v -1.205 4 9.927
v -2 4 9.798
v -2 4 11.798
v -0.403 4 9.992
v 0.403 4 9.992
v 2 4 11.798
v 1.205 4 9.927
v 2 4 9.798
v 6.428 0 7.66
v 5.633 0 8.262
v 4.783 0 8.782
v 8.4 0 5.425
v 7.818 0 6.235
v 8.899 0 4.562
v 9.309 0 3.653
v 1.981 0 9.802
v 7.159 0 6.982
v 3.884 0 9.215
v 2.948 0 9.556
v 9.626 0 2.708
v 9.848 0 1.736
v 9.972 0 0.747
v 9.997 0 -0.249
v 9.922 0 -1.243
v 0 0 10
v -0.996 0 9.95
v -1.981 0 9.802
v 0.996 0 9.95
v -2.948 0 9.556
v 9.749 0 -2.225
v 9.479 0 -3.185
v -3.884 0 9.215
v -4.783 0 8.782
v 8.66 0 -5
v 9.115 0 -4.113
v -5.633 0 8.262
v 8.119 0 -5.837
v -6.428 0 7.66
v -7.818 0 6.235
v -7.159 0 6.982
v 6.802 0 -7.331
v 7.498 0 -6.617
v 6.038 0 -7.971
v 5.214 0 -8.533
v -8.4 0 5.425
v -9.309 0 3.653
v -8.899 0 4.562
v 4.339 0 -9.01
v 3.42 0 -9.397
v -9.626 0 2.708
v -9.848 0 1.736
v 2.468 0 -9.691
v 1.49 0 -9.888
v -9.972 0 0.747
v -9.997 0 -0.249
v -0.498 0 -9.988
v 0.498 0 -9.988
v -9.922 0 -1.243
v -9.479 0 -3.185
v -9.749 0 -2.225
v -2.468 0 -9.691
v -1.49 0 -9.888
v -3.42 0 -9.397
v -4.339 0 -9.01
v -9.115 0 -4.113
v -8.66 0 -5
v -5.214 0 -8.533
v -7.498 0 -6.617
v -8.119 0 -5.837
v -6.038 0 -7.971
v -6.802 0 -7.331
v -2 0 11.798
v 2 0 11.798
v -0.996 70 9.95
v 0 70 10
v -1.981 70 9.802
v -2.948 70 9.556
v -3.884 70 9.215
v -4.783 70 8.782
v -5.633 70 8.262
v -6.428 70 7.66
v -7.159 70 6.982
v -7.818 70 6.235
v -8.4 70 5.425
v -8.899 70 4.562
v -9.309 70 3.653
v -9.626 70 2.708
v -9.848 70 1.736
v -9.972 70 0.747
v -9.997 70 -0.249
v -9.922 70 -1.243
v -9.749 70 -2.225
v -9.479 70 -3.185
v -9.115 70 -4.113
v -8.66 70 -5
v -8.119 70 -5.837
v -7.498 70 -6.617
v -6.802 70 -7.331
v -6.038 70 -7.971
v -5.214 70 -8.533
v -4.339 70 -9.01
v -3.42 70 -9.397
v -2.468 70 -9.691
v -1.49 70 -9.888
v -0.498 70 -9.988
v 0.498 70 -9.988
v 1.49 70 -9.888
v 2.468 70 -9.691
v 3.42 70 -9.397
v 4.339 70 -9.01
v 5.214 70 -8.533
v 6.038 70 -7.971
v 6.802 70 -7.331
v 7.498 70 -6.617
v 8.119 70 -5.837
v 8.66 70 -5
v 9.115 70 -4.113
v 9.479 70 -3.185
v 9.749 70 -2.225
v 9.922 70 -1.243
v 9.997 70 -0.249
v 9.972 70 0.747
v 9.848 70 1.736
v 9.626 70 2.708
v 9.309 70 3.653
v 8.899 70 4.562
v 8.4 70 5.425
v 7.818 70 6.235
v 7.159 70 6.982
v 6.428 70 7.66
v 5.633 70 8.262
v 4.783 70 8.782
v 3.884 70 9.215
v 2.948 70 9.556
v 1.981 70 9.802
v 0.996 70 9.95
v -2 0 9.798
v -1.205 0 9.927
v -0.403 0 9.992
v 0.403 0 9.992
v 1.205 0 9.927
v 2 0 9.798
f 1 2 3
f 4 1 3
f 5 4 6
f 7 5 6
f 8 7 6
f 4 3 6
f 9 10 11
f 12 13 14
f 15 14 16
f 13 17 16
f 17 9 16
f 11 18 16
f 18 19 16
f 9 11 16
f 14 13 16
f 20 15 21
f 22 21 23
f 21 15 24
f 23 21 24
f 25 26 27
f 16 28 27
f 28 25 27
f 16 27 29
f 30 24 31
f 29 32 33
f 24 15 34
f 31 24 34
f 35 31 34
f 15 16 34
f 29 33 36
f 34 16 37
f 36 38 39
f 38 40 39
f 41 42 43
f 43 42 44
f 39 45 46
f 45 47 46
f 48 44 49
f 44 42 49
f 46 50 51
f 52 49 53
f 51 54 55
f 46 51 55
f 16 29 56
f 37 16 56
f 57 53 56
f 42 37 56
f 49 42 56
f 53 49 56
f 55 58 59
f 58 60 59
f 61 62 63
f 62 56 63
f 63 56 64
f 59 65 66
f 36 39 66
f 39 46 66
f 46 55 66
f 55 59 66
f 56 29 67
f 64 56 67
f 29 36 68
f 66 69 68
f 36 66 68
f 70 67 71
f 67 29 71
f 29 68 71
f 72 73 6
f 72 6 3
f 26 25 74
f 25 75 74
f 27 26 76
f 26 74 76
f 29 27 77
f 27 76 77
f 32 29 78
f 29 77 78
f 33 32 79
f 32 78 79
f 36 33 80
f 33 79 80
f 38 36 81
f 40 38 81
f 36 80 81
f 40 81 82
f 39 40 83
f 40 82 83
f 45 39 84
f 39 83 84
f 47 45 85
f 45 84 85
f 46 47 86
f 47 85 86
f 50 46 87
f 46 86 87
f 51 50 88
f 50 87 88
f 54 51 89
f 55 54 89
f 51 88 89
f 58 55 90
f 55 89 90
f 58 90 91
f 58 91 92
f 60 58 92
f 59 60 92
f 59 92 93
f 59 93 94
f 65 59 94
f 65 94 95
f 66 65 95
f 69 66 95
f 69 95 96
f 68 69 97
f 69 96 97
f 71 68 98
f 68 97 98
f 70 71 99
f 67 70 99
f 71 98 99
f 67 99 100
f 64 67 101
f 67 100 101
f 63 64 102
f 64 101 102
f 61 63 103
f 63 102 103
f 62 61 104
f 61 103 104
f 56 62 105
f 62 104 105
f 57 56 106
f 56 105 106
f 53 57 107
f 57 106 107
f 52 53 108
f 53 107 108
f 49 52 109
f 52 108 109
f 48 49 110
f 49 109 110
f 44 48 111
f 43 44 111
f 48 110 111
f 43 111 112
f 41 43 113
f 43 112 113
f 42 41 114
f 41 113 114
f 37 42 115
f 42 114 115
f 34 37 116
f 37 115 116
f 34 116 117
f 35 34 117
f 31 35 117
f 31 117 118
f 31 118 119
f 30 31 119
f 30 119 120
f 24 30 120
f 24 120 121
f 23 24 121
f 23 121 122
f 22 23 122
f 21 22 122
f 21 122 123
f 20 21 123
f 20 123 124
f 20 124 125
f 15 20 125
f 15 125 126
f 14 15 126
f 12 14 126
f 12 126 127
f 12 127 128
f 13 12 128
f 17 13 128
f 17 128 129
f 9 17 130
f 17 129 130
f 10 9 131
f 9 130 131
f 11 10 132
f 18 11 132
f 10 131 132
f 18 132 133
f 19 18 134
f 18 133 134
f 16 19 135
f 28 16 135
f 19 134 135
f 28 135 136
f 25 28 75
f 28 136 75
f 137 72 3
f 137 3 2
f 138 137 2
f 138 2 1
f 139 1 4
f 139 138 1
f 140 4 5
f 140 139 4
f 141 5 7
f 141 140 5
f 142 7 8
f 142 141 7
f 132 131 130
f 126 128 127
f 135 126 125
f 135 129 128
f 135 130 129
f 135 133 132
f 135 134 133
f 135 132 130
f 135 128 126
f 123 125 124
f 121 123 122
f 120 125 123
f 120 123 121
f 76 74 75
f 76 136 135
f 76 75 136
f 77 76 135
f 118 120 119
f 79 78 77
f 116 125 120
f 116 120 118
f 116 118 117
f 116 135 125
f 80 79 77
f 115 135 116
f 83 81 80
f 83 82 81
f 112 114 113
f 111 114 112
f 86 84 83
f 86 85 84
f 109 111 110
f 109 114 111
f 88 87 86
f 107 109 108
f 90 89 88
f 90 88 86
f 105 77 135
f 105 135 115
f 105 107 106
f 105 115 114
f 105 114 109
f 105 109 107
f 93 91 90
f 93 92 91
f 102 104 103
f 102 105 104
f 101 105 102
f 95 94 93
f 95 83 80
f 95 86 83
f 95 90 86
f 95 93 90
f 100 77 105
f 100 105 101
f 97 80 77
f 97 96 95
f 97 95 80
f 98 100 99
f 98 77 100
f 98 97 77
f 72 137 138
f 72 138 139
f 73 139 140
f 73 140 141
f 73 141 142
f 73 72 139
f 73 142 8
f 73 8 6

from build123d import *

# Parameters (mm, degrees)
SKETCH1_W           = 10
SKETCH1_H           = 70
BOSS_EXTRUDE1_DEPTH = 4


with BuildPart() as part:
    # Sketch1 → Revolve1 (revolve)
    with BuildSketch(Plane.XY, mode=Mode.PRIVATE) as revolve1_sk:
        with Locations((5, 35)):
            Rectangle(SKETCH1_W, SKETCH1_H)
    revolve(revolve1_sk.sketch.rotate(Axis((0, 70, 0), (0, -1, 0)), 90), axis=Axis((0, 70, 0), (0, -1, 0)))


with BuildPart() as body_2:
    # Sketch2 → Boss-Extrude1 (new body)
    with BuildSketch(Plane.XZ):
        with BuildLine():
            Line((-2, 11.797958971), (-2, 9.797958971))
            ThreePointArc((-2, 9.797958971), (0, 10), (2, 9.797958971))
            Line((2, 9.797958971), (2, 11.797958971))
            Line((2, 11.797958971), (-2, 11.797958971))
        make_face()
    extrude(amount=-BOSS_EXTRUDE1_DEPTH)


solid = Compound([part.part, body_2.part])
